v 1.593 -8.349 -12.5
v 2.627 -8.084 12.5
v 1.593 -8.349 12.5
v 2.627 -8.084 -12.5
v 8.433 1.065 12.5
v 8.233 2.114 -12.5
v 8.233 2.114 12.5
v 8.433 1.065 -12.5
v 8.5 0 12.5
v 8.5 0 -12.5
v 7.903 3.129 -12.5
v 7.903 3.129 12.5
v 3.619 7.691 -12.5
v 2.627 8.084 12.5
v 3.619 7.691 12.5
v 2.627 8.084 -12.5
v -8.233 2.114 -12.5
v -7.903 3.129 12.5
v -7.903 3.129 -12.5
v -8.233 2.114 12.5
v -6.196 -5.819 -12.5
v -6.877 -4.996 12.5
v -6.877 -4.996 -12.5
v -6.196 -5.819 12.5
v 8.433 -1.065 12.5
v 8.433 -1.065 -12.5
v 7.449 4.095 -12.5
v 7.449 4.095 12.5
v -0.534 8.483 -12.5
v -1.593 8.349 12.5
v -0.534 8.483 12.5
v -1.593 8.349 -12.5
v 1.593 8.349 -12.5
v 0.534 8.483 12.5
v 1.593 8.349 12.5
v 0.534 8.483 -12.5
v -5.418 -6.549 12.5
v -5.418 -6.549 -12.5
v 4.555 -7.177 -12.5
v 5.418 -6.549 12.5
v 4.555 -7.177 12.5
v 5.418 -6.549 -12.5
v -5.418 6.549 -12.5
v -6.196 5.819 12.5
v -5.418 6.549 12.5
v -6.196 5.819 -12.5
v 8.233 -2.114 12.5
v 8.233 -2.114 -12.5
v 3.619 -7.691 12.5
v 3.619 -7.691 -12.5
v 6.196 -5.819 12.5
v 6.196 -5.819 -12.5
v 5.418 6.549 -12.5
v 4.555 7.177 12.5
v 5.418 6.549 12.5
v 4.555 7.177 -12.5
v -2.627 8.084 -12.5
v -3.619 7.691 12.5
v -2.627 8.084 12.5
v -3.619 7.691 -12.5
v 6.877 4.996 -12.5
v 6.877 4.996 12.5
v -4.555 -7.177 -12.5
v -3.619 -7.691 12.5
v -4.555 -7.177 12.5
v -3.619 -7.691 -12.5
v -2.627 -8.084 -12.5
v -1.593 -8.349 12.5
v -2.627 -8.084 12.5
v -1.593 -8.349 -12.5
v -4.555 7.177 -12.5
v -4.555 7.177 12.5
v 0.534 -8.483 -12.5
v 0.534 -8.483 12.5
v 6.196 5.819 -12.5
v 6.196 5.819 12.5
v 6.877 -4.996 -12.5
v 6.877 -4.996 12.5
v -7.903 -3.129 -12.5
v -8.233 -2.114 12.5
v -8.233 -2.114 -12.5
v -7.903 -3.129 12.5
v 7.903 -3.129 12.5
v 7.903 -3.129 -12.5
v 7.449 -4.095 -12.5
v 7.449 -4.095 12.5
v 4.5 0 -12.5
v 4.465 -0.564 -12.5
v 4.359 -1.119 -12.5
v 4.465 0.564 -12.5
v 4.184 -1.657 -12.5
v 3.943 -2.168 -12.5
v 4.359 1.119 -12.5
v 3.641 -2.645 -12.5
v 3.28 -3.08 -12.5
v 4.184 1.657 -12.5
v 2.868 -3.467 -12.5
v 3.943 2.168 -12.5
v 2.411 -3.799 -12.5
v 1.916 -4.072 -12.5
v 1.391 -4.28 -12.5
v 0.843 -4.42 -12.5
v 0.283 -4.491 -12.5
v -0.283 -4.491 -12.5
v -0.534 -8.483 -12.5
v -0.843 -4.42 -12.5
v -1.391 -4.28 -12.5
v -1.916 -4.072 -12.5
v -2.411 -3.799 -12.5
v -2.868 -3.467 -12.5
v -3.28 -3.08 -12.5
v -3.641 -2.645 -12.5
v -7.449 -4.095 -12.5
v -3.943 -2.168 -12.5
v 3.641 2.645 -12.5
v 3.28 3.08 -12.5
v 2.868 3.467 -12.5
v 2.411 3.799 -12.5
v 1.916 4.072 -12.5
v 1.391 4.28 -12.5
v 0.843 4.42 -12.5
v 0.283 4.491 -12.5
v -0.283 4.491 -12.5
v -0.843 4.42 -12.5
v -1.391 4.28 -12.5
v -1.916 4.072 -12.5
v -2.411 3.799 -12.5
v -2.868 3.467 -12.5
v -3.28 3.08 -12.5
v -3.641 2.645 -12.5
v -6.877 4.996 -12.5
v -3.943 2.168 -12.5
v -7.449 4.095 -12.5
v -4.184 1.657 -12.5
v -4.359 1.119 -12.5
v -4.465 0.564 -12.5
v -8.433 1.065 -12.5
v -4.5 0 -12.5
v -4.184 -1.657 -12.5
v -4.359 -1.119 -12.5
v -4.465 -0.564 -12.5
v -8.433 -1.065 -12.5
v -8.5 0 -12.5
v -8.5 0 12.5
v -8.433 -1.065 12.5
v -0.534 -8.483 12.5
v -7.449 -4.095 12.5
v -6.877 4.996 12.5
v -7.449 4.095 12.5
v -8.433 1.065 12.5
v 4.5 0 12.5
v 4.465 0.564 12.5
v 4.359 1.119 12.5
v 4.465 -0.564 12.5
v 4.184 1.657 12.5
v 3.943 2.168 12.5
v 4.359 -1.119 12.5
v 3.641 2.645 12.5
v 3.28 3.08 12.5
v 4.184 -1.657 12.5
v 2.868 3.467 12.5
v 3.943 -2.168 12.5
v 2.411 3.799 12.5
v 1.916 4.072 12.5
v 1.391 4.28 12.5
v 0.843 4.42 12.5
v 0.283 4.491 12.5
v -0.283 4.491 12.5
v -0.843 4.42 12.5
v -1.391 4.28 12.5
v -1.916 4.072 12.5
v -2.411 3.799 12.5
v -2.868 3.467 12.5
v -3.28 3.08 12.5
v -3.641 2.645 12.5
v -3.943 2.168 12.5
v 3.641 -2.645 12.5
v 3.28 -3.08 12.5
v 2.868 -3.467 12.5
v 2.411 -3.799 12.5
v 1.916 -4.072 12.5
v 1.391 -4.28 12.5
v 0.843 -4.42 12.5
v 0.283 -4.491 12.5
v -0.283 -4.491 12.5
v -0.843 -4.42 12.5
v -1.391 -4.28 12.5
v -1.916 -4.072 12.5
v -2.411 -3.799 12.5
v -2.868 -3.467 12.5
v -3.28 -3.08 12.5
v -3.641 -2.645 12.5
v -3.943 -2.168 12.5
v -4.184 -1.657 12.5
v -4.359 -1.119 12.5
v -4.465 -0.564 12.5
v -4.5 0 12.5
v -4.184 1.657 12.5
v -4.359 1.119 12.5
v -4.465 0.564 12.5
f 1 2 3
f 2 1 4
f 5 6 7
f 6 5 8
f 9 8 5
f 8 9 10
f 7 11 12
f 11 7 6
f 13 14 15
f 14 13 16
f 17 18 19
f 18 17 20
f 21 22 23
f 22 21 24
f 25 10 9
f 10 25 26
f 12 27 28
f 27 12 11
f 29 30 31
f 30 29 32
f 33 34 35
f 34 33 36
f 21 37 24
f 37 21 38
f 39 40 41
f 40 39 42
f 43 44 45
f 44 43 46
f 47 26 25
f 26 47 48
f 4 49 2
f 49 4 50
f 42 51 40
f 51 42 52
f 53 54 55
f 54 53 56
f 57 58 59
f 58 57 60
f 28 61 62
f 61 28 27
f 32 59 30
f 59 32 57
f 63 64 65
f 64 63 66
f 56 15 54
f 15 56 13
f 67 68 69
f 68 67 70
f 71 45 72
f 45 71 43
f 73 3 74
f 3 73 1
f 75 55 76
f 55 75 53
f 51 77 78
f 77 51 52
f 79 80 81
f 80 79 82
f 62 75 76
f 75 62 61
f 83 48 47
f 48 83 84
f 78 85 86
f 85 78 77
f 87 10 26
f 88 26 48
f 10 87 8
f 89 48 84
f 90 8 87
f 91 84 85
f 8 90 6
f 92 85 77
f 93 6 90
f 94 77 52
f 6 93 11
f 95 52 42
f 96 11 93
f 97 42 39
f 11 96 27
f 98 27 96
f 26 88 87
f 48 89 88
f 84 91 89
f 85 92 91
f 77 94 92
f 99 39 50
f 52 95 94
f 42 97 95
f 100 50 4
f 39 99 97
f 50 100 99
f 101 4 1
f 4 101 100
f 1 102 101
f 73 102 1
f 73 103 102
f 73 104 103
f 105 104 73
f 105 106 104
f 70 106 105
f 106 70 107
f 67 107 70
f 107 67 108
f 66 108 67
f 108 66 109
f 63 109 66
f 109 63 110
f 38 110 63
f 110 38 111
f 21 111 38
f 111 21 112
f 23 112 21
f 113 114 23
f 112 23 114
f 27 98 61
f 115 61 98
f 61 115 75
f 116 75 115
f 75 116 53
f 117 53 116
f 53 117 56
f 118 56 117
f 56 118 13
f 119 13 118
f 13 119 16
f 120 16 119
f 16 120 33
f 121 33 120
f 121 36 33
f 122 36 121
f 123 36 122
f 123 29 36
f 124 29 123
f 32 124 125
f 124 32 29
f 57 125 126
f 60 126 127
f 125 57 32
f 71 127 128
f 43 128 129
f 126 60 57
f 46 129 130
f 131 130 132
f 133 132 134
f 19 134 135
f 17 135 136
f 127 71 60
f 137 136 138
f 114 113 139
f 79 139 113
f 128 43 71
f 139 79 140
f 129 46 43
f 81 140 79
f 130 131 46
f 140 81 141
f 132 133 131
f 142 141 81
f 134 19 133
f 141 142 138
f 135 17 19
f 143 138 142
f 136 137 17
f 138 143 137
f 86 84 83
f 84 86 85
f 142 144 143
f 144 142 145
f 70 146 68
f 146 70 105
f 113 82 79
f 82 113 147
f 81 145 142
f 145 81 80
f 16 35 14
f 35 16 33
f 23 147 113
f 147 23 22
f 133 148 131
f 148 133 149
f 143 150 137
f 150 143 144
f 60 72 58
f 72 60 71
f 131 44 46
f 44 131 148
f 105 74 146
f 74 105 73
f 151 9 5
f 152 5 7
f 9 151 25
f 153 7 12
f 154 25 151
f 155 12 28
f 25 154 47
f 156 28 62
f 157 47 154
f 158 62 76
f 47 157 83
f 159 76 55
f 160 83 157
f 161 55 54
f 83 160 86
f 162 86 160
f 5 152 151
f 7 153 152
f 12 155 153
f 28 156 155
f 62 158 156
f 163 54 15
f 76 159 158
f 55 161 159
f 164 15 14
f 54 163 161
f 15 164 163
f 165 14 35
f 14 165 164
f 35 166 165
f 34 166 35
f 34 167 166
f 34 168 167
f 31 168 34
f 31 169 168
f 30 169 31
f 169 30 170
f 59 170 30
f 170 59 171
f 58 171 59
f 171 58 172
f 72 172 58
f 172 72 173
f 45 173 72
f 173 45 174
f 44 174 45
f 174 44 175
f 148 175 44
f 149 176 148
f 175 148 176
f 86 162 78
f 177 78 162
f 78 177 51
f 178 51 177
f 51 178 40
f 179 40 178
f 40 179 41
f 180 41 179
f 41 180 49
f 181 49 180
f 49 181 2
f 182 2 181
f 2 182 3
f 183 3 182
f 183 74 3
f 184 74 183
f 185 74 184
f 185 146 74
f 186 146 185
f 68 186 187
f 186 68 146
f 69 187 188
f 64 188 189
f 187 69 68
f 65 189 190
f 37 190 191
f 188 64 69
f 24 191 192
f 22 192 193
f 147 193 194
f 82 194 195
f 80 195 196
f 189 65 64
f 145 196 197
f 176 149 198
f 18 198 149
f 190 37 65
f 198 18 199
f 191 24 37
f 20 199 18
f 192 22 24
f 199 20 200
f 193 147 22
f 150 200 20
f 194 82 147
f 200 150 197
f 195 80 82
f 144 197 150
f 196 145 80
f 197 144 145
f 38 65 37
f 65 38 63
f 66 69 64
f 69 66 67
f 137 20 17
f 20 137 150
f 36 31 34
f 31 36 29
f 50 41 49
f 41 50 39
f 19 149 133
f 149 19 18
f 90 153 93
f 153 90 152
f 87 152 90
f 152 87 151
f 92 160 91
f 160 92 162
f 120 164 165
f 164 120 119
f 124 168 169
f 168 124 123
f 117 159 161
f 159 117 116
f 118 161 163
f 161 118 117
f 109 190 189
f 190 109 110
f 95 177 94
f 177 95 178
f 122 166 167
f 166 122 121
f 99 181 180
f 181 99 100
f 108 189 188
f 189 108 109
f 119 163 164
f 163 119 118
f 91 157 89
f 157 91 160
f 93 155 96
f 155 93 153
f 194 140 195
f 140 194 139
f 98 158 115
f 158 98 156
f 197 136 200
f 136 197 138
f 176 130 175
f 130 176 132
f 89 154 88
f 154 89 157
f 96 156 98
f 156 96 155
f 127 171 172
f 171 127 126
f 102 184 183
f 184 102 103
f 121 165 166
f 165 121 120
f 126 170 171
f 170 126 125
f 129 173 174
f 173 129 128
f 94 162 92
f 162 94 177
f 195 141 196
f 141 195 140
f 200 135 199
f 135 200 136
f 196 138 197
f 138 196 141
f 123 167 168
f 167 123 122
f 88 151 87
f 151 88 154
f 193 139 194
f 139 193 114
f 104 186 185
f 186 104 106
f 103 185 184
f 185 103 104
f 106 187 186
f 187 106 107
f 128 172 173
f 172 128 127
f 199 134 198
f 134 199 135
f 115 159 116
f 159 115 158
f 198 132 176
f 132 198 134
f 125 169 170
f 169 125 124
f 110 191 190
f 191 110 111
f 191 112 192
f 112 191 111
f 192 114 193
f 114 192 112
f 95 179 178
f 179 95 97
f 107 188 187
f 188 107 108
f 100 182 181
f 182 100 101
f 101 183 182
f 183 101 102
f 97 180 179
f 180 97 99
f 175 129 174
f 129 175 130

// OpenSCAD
$fn = 50;


difference() {
	union() {
		translate(v = [0, 0, -12.5000000000]) {
			cylinder(h = 25, r = 8.5000000000);
		}
	}
	union() {
		translate(v = [0, 0, -100.0000000000]) {
			cylinder(h = 200, r = 4.5000000000);
		}
	}
}
